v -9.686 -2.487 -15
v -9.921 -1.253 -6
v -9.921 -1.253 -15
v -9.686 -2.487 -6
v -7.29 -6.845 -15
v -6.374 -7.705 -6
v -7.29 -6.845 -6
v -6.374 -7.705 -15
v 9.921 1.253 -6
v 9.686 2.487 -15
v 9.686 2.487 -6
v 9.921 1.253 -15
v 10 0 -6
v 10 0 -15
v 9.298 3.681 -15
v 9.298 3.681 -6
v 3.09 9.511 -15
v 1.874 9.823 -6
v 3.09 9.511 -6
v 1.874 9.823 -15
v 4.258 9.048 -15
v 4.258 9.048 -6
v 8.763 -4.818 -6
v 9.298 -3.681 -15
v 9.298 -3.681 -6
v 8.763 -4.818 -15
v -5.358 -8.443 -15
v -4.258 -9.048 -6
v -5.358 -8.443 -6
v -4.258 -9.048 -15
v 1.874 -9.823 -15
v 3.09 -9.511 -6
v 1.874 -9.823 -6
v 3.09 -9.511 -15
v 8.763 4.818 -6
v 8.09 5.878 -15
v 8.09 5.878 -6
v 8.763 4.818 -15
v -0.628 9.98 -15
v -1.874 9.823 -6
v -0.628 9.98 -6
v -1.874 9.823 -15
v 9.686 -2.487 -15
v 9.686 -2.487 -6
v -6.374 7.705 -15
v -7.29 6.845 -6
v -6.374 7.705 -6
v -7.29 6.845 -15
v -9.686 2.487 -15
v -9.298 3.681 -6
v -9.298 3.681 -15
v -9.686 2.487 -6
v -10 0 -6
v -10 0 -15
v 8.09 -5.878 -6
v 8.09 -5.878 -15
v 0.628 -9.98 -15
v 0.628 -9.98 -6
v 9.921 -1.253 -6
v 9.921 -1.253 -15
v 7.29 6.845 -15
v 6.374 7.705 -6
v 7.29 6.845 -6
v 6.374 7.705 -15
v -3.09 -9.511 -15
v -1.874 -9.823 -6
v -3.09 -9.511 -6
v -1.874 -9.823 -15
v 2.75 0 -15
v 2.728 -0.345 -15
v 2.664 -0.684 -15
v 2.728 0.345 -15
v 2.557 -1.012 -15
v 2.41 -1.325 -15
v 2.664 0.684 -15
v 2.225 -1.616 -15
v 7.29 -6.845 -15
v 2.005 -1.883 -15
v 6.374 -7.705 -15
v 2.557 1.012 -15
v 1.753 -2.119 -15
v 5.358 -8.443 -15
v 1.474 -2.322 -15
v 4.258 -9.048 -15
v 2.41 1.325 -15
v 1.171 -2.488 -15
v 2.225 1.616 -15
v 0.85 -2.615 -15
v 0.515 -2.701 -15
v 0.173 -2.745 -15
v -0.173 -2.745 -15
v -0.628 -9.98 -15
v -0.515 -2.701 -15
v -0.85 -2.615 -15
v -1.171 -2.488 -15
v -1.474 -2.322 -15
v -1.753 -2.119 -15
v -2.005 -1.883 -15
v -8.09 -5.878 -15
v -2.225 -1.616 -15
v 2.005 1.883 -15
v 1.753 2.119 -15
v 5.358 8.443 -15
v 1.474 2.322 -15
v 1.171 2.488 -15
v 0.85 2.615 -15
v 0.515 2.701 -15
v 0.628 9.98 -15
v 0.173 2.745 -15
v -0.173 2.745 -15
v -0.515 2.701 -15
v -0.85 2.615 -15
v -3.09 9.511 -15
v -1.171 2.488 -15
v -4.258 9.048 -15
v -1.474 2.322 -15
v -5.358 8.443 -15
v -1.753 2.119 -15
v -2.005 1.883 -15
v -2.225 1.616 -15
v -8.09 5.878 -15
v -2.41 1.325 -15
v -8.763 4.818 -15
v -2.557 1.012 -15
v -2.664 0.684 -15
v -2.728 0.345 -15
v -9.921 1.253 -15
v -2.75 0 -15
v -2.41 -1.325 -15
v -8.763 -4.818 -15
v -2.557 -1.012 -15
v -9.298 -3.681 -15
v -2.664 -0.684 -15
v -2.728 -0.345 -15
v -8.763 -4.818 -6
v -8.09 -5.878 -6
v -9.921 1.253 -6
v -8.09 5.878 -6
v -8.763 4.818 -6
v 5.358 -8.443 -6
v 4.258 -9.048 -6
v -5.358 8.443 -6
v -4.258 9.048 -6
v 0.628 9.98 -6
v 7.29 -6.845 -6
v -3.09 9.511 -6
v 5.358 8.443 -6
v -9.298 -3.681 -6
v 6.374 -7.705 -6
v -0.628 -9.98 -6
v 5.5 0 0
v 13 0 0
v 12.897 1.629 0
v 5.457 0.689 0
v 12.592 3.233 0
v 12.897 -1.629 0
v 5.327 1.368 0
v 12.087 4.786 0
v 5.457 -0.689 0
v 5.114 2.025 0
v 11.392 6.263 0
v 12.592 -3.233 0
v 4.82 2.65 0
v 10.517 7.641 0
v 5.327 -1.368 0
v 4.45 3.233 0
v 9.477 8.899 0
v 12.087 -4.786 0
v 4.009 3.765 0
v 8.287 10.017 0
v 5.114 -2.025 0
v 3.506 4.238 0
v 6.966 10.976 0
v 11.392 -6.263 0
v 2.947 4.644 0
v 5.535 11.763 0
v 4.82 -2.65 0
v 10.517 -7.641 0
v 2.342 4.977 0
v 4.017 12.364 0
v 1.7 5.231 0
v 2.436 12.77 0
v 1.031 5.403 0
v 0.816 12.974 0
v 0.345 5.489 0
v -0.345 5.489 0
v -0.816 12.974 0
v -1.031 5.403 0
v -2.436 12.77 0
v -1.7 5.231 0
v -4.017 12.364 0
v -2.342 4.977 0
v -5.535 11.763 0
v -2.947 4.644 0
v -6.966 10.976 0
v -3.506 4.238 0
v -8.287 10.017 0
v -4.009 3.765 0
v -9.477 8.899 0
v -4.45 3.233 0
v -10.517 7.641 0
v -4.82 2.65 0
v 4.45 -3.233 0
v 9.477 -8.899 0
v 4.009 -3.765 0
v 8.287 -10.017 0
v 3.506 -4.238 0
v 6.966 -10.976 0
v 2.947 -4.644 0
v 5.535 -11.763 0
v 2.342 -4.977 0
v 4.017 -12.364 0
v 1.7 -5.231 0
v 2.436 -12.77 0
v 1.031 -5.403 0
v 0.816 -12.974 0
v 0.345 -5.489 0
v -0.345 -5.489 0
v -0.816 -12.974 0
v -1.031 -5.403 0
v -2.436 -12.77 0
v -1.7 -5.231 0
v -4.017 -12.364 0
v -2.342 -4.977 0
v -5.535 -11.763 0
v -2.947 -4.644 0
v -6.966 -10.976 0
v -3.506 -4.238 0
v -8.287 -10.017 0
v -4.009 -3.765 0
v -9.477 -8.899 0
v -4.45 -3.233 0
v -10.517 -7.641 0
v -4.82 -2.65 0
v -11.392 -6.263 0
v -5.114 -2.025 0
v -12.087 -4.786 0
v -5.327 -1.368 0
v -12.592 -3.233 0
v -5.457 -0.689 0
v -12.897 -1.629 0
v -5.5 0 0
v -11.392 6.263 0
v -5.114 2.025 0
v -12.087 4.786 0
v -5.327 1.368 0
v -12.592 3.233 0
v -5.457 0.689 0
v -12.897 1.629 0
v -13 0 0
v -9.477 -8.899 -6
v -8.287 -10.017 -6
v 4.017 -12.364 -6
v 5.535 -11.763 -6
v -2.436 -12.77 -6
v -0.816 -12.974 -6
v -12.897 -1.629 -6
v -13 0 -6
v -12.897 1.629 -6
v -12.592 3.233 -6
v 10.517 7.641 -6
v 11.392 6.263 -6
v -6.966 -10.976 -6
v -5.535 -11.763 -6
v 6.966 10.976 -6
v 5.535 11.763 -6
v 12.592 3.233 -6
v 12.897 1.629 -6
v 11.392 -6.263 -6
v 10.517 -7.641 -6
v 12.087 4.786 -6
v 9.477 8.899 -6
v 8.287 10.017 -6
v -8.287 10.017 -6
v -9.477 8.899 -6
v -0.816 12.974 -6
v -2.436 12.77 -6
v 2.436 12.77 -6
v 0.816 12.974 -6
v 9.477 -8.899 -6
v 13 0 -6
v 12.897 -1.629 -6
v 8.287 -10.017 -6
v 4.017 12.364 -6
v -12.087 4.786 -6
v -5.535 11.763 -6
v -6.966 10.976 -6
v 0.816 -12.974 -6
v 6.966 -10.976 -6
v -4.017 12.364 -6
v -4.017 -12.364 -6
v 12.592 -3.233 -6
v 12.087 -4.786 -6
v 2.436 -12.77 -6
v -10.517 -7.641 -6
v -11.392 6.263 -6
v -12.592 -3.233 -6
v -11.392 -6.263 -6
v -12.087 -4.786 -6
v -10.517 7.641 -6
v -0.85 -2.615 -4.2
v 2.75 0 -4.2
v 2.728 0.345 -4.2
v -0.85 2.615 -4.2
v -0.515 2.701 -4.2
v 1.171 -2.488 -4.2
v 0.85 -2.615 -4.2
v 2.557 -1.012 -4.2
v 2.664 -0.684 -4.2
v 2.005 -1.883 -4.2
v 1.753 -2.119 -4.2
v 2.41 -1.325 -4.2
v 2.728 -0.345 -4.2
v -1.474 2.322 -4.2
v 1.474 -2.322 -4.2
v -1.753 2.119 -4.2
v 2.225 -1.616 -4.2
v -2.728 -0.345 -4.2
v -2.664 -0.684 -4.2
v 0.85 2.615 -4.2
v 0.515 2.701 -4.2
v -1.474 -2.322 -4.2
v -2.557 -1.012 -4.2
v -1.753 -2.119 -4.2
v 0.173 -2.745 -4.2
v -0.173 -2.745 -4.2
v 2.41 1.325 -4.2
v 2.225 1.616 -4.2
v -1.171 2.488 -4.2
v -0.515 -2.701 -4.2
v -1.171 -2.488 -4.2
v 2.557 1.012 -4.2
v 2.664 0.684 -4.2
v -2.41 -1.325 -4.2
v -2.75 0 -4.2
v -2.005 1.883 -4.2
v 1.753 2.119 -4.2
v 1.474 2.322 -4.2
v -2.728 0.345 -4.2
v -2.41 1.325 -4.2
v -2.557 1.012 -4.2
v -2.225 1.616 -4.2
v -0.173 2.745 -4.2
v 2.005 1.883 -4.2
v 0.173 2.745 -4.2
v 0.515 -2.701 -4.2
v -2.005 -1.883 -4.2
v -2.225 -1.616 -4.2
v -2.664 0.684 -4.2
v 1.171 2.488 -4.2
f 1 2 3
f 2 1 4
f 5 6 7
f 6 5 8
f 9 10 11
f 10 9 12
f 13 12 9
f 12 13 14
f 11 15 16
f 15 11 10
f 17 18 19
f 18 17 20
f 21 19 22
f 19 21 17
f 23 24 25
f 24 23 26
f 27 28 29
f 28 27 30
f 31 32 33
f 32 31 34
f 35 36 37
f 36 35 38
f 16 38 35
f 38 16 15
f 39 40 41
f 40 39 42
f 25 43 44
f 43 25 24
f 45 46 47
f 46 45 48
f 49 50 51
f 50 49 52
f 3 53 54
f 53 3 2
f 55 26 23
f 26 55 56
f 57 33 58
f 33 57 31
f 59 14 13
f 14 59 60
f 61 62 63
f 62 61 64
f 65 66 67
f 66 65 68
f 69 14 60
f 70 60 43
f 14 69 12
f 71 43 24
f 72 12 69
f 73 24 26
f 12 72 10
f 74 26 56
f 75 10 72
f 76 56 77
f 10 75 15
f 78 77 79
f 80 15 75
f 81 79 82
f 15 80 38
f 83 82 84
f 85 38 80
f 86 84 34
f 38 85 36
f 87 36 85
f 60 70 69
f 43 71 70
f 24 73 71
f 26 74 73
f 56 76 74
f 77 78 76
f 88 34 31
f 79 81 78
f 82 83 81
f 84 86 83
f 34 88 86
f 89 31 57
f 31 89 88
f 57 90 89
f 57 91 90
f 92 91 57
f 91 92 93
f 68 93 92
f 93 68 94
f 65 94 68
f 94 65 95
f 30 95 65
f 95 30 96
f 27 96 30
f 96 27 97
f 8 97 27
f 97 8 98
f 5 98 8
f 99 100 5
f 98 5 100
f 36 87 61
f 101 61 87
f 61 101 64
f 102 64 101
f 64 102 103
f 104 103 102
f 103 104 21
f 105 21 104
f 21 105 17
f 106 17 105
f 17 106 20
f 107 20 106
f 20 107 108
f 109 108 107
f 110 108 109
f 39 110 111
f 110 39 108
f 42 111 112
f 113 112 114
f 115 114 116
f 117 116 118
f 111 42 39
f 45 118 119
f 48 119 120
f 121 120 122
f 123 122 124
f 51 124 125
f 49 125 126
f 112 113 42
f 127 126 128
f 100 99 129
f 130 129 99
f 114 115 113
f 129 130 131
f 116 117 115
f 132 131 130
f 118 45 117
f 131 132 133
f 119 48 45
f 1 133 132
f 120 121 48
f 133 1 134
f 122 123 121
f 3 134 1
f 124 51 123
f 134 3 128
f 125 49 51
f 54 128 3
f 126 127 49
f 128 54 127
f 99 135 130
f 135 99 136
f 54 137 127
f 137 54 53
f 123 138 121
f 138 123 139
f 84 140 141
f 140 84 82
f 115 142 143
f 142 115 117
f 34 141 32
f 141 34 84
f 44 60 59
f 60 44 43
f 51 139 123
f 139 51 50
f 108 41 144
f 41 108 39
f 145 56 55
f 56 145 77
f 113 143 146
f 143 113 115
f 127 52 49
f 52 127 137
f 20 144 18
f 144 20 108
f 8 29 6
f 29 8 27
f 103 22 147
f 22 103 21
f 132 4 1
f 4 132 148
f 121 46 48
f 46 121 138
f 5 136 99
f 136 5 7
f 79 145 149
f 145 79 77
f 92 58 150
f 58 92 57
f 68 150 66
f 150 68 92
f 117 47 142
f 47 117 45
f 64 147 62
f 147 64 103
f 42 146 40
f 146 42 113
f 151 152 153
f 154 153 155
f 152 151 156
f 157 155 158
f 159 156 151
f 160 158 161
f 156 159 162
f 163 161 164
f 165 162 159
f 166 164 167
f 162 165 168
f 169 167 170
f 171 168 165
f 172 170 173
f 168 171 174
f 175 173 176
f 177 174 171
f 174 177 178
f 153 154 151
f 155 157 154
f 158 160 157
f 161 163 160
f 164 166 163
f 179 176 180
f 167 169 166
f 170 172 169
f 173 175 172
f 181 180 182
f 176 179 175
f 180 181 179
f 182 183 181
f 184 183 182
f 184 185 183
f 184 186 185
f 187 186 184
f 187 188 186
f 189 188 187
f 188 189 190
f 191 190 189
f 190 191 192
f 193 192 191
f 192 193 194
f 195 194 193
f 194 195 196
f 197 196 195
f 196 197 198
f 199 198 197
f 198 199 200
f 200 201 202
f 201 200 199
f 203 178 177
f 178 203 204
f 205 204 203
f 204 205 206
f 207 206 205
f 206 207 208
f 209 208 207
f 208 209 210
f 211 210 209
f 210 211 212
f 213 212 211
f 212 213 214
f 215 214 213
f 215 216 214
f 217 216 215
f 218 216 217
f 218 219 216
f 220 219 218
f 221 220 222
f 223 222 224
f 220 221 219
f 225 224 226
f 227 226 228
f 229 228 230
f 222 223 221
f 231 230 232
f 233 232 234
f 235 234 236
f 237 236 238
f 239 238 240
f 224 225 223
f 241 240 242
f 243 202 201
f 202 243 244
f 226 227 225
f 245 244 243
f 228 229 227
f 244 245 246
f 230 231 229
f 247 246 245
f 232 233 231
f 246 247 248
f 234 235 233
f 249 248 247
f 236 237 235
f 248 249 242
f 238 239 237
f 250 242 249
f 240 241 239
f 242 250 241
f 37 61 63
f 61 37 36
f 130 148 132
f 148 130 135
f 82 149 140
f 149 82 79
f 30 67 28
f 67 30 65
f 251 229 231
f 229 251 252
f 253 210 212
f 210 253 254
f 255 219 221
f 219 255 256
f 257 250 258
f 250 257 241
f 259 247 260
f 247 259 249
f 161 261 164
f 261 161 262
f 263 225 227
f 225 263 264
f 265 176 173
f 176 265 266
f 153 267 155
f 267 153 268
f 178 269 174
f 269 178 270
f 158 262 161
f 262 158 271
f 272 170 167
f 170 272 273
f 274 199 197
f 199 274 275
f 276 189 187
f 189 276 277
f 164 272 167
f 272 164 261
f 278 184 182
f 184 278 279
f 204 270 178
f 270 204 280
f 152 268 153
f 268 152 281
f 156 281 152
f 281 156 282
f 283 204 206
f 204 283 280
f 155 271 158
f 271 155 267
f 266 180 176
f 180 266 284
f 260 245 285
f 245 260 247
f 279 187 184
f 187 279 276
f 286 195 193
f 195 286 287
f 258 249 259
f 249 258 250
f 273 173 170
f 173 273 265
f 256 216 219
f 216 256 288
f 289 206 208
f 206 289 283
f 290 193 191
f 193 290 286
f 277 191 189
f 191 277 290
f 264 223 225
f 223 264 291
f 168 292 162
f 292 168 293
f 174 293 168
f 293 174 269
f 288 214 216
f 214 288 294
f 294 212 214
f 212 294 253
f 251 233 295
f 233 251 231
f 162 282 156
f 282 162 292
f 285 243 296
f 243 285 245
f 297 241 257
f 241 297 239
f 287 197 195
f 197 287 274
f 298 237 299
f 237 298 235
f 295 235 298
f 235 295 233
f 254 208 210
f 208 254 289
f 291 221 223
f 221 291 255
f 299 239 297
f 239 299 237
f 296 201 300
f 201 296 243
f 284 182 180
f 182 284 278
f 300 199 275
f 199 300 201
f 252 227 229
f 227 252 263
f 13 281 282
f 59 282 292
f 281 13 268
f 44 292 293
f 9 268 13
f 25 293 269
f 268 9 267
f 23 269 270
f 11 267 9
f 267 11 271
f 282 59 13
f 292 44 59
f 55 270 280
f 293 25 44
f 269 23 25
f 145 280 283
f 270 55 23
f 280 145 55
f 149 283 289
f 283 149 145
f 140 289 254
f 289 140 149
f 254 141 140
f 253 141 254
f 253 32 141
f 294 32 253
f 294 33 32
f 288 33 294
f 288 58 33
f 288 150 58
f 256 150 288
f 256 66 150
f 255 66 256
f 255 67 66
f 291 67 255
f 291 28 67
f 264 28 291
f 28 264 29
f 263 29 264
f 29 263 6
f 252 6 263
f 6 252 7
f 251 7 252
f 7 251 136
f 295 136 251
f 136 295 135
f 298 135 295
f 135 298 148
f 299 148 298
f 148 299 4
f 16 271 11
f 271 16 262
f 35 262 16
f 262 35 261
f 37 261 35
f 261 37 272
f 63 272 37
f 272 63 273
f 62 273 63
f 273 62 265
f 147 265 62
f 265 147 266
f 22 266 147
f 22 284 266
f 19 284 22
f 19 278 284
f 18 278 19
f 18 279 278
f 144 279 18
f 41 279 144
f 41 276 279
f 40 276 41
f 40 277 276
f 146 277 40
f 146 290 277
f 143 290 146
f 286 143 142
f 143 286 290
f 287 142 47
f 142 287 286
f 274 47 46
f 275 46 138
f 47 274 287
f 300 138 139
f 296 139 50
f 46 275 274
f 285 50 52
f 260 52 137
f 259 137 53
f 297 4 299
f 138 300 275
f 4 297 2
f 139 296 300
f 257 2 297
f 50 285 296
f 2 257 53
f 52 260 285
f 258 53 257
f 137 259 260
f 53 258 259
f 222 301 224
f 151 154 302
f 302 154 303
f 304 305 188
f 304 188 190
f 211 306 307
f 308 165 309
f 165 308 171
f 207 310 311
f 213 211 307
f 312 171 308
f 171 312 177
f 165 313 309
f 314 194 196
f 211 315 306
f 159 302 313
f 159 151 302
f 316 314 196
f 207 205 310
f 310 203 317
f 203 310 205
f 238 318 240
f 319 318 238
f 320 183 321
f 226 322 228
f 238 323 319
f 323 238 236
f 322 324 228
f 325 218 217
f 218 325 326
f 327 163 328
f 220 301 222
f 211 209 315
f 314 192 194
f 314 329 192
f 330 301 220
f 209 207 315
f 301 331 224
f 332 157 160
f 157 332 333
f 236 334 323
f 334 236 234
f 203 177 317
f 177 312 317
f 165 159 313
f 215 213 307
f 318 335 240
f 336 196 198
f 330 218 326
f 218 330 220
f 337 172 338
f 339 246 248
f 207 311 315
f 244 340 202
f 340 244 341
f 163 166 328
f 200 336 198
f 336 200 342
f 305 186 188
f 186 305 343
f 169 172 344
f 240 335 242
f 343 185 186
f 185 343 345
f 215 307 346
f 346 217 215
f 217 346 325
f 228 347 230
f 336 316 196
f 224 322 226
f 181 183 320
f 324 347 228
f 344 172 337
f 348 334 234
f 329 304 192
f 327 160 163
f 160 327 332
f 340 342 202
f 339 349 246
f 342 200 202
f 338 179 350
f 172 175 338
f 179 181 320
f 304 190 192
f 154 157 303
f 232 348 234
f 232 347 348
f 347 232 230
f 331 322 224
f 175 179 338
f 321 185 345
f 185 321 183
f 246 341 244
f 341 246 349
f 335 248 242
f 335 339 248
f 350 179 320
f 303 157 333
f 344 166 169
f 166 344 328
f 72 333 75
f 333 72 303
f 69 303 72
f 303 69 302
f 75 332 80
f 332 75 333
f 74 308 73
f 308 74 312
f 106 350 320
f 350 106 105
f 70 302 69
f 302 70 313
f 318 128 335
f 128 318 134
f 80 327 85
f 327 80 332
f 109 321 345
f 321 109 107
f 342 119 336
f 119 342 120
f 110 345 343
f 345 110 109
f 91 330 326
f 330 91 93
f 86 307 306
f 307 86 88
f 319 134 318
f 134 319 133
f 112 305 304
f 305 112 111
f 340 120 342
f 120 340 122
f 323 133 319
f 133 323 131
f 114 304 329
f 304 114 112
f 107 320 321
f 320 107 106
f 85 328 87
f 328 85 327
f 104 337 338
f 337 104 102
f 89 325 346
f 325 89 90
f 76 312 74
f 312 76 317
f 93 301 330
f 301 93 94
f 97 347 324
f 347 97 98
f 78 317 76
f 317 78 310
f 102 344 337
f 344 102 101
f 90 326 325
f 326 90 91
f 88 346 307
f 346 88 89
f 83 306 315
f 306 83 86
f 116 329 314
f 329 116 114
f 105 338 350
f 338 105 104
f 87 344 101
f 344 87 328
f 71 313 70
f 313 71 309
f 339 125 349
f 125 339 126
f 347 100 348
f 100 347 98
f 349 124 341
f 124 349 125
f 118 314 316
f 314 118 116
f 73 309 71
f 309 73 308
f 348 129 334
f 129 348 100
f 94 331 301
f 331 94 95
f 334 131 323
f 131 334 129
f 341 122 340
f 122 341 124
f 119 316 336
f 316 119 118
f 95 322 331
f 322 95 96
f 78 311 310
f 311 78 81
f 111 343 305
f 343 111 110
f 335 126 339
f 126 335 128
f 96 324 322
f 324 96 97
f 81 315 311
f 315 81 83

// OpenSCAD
$fn = 50;


difference() {
	union() {
		translate(v = [0, 0, -15.0000000000]) {
			cylinder(h = 15, r = 10.0000000000);
		}
		translate(v = [0, 0, -6.0000000000]) {
			cylinder(h = 6, r = 13.0000000000);
		}
	}
	union() {
		translate(v = [0, 0, 0]) {
			rotate(a = [0, 0, 0]) {
				difference() {
					union() {
						#translate(v = [0, 0, -15.0000000000]) {
							cylinder(h = 15, r = 2.2500000000);
						}
						#translate(v = [0, 0, -4.2000000000]) {
							cylinder(h = 4.2000000000, r1 = 2.7500000000, r2 = 5.5000000000);
						}
						#translate(v = [0, 0, -15.0000000000]) {
							cylinder(h = 15, r = 2.7500000000);
						}
						#translate(v = [0, 0, -15.0000000000]) {
							cylinder(h = 15, r = 2.2500000000);
						}
					}
					union();
				}
			}
		}
	}
}
